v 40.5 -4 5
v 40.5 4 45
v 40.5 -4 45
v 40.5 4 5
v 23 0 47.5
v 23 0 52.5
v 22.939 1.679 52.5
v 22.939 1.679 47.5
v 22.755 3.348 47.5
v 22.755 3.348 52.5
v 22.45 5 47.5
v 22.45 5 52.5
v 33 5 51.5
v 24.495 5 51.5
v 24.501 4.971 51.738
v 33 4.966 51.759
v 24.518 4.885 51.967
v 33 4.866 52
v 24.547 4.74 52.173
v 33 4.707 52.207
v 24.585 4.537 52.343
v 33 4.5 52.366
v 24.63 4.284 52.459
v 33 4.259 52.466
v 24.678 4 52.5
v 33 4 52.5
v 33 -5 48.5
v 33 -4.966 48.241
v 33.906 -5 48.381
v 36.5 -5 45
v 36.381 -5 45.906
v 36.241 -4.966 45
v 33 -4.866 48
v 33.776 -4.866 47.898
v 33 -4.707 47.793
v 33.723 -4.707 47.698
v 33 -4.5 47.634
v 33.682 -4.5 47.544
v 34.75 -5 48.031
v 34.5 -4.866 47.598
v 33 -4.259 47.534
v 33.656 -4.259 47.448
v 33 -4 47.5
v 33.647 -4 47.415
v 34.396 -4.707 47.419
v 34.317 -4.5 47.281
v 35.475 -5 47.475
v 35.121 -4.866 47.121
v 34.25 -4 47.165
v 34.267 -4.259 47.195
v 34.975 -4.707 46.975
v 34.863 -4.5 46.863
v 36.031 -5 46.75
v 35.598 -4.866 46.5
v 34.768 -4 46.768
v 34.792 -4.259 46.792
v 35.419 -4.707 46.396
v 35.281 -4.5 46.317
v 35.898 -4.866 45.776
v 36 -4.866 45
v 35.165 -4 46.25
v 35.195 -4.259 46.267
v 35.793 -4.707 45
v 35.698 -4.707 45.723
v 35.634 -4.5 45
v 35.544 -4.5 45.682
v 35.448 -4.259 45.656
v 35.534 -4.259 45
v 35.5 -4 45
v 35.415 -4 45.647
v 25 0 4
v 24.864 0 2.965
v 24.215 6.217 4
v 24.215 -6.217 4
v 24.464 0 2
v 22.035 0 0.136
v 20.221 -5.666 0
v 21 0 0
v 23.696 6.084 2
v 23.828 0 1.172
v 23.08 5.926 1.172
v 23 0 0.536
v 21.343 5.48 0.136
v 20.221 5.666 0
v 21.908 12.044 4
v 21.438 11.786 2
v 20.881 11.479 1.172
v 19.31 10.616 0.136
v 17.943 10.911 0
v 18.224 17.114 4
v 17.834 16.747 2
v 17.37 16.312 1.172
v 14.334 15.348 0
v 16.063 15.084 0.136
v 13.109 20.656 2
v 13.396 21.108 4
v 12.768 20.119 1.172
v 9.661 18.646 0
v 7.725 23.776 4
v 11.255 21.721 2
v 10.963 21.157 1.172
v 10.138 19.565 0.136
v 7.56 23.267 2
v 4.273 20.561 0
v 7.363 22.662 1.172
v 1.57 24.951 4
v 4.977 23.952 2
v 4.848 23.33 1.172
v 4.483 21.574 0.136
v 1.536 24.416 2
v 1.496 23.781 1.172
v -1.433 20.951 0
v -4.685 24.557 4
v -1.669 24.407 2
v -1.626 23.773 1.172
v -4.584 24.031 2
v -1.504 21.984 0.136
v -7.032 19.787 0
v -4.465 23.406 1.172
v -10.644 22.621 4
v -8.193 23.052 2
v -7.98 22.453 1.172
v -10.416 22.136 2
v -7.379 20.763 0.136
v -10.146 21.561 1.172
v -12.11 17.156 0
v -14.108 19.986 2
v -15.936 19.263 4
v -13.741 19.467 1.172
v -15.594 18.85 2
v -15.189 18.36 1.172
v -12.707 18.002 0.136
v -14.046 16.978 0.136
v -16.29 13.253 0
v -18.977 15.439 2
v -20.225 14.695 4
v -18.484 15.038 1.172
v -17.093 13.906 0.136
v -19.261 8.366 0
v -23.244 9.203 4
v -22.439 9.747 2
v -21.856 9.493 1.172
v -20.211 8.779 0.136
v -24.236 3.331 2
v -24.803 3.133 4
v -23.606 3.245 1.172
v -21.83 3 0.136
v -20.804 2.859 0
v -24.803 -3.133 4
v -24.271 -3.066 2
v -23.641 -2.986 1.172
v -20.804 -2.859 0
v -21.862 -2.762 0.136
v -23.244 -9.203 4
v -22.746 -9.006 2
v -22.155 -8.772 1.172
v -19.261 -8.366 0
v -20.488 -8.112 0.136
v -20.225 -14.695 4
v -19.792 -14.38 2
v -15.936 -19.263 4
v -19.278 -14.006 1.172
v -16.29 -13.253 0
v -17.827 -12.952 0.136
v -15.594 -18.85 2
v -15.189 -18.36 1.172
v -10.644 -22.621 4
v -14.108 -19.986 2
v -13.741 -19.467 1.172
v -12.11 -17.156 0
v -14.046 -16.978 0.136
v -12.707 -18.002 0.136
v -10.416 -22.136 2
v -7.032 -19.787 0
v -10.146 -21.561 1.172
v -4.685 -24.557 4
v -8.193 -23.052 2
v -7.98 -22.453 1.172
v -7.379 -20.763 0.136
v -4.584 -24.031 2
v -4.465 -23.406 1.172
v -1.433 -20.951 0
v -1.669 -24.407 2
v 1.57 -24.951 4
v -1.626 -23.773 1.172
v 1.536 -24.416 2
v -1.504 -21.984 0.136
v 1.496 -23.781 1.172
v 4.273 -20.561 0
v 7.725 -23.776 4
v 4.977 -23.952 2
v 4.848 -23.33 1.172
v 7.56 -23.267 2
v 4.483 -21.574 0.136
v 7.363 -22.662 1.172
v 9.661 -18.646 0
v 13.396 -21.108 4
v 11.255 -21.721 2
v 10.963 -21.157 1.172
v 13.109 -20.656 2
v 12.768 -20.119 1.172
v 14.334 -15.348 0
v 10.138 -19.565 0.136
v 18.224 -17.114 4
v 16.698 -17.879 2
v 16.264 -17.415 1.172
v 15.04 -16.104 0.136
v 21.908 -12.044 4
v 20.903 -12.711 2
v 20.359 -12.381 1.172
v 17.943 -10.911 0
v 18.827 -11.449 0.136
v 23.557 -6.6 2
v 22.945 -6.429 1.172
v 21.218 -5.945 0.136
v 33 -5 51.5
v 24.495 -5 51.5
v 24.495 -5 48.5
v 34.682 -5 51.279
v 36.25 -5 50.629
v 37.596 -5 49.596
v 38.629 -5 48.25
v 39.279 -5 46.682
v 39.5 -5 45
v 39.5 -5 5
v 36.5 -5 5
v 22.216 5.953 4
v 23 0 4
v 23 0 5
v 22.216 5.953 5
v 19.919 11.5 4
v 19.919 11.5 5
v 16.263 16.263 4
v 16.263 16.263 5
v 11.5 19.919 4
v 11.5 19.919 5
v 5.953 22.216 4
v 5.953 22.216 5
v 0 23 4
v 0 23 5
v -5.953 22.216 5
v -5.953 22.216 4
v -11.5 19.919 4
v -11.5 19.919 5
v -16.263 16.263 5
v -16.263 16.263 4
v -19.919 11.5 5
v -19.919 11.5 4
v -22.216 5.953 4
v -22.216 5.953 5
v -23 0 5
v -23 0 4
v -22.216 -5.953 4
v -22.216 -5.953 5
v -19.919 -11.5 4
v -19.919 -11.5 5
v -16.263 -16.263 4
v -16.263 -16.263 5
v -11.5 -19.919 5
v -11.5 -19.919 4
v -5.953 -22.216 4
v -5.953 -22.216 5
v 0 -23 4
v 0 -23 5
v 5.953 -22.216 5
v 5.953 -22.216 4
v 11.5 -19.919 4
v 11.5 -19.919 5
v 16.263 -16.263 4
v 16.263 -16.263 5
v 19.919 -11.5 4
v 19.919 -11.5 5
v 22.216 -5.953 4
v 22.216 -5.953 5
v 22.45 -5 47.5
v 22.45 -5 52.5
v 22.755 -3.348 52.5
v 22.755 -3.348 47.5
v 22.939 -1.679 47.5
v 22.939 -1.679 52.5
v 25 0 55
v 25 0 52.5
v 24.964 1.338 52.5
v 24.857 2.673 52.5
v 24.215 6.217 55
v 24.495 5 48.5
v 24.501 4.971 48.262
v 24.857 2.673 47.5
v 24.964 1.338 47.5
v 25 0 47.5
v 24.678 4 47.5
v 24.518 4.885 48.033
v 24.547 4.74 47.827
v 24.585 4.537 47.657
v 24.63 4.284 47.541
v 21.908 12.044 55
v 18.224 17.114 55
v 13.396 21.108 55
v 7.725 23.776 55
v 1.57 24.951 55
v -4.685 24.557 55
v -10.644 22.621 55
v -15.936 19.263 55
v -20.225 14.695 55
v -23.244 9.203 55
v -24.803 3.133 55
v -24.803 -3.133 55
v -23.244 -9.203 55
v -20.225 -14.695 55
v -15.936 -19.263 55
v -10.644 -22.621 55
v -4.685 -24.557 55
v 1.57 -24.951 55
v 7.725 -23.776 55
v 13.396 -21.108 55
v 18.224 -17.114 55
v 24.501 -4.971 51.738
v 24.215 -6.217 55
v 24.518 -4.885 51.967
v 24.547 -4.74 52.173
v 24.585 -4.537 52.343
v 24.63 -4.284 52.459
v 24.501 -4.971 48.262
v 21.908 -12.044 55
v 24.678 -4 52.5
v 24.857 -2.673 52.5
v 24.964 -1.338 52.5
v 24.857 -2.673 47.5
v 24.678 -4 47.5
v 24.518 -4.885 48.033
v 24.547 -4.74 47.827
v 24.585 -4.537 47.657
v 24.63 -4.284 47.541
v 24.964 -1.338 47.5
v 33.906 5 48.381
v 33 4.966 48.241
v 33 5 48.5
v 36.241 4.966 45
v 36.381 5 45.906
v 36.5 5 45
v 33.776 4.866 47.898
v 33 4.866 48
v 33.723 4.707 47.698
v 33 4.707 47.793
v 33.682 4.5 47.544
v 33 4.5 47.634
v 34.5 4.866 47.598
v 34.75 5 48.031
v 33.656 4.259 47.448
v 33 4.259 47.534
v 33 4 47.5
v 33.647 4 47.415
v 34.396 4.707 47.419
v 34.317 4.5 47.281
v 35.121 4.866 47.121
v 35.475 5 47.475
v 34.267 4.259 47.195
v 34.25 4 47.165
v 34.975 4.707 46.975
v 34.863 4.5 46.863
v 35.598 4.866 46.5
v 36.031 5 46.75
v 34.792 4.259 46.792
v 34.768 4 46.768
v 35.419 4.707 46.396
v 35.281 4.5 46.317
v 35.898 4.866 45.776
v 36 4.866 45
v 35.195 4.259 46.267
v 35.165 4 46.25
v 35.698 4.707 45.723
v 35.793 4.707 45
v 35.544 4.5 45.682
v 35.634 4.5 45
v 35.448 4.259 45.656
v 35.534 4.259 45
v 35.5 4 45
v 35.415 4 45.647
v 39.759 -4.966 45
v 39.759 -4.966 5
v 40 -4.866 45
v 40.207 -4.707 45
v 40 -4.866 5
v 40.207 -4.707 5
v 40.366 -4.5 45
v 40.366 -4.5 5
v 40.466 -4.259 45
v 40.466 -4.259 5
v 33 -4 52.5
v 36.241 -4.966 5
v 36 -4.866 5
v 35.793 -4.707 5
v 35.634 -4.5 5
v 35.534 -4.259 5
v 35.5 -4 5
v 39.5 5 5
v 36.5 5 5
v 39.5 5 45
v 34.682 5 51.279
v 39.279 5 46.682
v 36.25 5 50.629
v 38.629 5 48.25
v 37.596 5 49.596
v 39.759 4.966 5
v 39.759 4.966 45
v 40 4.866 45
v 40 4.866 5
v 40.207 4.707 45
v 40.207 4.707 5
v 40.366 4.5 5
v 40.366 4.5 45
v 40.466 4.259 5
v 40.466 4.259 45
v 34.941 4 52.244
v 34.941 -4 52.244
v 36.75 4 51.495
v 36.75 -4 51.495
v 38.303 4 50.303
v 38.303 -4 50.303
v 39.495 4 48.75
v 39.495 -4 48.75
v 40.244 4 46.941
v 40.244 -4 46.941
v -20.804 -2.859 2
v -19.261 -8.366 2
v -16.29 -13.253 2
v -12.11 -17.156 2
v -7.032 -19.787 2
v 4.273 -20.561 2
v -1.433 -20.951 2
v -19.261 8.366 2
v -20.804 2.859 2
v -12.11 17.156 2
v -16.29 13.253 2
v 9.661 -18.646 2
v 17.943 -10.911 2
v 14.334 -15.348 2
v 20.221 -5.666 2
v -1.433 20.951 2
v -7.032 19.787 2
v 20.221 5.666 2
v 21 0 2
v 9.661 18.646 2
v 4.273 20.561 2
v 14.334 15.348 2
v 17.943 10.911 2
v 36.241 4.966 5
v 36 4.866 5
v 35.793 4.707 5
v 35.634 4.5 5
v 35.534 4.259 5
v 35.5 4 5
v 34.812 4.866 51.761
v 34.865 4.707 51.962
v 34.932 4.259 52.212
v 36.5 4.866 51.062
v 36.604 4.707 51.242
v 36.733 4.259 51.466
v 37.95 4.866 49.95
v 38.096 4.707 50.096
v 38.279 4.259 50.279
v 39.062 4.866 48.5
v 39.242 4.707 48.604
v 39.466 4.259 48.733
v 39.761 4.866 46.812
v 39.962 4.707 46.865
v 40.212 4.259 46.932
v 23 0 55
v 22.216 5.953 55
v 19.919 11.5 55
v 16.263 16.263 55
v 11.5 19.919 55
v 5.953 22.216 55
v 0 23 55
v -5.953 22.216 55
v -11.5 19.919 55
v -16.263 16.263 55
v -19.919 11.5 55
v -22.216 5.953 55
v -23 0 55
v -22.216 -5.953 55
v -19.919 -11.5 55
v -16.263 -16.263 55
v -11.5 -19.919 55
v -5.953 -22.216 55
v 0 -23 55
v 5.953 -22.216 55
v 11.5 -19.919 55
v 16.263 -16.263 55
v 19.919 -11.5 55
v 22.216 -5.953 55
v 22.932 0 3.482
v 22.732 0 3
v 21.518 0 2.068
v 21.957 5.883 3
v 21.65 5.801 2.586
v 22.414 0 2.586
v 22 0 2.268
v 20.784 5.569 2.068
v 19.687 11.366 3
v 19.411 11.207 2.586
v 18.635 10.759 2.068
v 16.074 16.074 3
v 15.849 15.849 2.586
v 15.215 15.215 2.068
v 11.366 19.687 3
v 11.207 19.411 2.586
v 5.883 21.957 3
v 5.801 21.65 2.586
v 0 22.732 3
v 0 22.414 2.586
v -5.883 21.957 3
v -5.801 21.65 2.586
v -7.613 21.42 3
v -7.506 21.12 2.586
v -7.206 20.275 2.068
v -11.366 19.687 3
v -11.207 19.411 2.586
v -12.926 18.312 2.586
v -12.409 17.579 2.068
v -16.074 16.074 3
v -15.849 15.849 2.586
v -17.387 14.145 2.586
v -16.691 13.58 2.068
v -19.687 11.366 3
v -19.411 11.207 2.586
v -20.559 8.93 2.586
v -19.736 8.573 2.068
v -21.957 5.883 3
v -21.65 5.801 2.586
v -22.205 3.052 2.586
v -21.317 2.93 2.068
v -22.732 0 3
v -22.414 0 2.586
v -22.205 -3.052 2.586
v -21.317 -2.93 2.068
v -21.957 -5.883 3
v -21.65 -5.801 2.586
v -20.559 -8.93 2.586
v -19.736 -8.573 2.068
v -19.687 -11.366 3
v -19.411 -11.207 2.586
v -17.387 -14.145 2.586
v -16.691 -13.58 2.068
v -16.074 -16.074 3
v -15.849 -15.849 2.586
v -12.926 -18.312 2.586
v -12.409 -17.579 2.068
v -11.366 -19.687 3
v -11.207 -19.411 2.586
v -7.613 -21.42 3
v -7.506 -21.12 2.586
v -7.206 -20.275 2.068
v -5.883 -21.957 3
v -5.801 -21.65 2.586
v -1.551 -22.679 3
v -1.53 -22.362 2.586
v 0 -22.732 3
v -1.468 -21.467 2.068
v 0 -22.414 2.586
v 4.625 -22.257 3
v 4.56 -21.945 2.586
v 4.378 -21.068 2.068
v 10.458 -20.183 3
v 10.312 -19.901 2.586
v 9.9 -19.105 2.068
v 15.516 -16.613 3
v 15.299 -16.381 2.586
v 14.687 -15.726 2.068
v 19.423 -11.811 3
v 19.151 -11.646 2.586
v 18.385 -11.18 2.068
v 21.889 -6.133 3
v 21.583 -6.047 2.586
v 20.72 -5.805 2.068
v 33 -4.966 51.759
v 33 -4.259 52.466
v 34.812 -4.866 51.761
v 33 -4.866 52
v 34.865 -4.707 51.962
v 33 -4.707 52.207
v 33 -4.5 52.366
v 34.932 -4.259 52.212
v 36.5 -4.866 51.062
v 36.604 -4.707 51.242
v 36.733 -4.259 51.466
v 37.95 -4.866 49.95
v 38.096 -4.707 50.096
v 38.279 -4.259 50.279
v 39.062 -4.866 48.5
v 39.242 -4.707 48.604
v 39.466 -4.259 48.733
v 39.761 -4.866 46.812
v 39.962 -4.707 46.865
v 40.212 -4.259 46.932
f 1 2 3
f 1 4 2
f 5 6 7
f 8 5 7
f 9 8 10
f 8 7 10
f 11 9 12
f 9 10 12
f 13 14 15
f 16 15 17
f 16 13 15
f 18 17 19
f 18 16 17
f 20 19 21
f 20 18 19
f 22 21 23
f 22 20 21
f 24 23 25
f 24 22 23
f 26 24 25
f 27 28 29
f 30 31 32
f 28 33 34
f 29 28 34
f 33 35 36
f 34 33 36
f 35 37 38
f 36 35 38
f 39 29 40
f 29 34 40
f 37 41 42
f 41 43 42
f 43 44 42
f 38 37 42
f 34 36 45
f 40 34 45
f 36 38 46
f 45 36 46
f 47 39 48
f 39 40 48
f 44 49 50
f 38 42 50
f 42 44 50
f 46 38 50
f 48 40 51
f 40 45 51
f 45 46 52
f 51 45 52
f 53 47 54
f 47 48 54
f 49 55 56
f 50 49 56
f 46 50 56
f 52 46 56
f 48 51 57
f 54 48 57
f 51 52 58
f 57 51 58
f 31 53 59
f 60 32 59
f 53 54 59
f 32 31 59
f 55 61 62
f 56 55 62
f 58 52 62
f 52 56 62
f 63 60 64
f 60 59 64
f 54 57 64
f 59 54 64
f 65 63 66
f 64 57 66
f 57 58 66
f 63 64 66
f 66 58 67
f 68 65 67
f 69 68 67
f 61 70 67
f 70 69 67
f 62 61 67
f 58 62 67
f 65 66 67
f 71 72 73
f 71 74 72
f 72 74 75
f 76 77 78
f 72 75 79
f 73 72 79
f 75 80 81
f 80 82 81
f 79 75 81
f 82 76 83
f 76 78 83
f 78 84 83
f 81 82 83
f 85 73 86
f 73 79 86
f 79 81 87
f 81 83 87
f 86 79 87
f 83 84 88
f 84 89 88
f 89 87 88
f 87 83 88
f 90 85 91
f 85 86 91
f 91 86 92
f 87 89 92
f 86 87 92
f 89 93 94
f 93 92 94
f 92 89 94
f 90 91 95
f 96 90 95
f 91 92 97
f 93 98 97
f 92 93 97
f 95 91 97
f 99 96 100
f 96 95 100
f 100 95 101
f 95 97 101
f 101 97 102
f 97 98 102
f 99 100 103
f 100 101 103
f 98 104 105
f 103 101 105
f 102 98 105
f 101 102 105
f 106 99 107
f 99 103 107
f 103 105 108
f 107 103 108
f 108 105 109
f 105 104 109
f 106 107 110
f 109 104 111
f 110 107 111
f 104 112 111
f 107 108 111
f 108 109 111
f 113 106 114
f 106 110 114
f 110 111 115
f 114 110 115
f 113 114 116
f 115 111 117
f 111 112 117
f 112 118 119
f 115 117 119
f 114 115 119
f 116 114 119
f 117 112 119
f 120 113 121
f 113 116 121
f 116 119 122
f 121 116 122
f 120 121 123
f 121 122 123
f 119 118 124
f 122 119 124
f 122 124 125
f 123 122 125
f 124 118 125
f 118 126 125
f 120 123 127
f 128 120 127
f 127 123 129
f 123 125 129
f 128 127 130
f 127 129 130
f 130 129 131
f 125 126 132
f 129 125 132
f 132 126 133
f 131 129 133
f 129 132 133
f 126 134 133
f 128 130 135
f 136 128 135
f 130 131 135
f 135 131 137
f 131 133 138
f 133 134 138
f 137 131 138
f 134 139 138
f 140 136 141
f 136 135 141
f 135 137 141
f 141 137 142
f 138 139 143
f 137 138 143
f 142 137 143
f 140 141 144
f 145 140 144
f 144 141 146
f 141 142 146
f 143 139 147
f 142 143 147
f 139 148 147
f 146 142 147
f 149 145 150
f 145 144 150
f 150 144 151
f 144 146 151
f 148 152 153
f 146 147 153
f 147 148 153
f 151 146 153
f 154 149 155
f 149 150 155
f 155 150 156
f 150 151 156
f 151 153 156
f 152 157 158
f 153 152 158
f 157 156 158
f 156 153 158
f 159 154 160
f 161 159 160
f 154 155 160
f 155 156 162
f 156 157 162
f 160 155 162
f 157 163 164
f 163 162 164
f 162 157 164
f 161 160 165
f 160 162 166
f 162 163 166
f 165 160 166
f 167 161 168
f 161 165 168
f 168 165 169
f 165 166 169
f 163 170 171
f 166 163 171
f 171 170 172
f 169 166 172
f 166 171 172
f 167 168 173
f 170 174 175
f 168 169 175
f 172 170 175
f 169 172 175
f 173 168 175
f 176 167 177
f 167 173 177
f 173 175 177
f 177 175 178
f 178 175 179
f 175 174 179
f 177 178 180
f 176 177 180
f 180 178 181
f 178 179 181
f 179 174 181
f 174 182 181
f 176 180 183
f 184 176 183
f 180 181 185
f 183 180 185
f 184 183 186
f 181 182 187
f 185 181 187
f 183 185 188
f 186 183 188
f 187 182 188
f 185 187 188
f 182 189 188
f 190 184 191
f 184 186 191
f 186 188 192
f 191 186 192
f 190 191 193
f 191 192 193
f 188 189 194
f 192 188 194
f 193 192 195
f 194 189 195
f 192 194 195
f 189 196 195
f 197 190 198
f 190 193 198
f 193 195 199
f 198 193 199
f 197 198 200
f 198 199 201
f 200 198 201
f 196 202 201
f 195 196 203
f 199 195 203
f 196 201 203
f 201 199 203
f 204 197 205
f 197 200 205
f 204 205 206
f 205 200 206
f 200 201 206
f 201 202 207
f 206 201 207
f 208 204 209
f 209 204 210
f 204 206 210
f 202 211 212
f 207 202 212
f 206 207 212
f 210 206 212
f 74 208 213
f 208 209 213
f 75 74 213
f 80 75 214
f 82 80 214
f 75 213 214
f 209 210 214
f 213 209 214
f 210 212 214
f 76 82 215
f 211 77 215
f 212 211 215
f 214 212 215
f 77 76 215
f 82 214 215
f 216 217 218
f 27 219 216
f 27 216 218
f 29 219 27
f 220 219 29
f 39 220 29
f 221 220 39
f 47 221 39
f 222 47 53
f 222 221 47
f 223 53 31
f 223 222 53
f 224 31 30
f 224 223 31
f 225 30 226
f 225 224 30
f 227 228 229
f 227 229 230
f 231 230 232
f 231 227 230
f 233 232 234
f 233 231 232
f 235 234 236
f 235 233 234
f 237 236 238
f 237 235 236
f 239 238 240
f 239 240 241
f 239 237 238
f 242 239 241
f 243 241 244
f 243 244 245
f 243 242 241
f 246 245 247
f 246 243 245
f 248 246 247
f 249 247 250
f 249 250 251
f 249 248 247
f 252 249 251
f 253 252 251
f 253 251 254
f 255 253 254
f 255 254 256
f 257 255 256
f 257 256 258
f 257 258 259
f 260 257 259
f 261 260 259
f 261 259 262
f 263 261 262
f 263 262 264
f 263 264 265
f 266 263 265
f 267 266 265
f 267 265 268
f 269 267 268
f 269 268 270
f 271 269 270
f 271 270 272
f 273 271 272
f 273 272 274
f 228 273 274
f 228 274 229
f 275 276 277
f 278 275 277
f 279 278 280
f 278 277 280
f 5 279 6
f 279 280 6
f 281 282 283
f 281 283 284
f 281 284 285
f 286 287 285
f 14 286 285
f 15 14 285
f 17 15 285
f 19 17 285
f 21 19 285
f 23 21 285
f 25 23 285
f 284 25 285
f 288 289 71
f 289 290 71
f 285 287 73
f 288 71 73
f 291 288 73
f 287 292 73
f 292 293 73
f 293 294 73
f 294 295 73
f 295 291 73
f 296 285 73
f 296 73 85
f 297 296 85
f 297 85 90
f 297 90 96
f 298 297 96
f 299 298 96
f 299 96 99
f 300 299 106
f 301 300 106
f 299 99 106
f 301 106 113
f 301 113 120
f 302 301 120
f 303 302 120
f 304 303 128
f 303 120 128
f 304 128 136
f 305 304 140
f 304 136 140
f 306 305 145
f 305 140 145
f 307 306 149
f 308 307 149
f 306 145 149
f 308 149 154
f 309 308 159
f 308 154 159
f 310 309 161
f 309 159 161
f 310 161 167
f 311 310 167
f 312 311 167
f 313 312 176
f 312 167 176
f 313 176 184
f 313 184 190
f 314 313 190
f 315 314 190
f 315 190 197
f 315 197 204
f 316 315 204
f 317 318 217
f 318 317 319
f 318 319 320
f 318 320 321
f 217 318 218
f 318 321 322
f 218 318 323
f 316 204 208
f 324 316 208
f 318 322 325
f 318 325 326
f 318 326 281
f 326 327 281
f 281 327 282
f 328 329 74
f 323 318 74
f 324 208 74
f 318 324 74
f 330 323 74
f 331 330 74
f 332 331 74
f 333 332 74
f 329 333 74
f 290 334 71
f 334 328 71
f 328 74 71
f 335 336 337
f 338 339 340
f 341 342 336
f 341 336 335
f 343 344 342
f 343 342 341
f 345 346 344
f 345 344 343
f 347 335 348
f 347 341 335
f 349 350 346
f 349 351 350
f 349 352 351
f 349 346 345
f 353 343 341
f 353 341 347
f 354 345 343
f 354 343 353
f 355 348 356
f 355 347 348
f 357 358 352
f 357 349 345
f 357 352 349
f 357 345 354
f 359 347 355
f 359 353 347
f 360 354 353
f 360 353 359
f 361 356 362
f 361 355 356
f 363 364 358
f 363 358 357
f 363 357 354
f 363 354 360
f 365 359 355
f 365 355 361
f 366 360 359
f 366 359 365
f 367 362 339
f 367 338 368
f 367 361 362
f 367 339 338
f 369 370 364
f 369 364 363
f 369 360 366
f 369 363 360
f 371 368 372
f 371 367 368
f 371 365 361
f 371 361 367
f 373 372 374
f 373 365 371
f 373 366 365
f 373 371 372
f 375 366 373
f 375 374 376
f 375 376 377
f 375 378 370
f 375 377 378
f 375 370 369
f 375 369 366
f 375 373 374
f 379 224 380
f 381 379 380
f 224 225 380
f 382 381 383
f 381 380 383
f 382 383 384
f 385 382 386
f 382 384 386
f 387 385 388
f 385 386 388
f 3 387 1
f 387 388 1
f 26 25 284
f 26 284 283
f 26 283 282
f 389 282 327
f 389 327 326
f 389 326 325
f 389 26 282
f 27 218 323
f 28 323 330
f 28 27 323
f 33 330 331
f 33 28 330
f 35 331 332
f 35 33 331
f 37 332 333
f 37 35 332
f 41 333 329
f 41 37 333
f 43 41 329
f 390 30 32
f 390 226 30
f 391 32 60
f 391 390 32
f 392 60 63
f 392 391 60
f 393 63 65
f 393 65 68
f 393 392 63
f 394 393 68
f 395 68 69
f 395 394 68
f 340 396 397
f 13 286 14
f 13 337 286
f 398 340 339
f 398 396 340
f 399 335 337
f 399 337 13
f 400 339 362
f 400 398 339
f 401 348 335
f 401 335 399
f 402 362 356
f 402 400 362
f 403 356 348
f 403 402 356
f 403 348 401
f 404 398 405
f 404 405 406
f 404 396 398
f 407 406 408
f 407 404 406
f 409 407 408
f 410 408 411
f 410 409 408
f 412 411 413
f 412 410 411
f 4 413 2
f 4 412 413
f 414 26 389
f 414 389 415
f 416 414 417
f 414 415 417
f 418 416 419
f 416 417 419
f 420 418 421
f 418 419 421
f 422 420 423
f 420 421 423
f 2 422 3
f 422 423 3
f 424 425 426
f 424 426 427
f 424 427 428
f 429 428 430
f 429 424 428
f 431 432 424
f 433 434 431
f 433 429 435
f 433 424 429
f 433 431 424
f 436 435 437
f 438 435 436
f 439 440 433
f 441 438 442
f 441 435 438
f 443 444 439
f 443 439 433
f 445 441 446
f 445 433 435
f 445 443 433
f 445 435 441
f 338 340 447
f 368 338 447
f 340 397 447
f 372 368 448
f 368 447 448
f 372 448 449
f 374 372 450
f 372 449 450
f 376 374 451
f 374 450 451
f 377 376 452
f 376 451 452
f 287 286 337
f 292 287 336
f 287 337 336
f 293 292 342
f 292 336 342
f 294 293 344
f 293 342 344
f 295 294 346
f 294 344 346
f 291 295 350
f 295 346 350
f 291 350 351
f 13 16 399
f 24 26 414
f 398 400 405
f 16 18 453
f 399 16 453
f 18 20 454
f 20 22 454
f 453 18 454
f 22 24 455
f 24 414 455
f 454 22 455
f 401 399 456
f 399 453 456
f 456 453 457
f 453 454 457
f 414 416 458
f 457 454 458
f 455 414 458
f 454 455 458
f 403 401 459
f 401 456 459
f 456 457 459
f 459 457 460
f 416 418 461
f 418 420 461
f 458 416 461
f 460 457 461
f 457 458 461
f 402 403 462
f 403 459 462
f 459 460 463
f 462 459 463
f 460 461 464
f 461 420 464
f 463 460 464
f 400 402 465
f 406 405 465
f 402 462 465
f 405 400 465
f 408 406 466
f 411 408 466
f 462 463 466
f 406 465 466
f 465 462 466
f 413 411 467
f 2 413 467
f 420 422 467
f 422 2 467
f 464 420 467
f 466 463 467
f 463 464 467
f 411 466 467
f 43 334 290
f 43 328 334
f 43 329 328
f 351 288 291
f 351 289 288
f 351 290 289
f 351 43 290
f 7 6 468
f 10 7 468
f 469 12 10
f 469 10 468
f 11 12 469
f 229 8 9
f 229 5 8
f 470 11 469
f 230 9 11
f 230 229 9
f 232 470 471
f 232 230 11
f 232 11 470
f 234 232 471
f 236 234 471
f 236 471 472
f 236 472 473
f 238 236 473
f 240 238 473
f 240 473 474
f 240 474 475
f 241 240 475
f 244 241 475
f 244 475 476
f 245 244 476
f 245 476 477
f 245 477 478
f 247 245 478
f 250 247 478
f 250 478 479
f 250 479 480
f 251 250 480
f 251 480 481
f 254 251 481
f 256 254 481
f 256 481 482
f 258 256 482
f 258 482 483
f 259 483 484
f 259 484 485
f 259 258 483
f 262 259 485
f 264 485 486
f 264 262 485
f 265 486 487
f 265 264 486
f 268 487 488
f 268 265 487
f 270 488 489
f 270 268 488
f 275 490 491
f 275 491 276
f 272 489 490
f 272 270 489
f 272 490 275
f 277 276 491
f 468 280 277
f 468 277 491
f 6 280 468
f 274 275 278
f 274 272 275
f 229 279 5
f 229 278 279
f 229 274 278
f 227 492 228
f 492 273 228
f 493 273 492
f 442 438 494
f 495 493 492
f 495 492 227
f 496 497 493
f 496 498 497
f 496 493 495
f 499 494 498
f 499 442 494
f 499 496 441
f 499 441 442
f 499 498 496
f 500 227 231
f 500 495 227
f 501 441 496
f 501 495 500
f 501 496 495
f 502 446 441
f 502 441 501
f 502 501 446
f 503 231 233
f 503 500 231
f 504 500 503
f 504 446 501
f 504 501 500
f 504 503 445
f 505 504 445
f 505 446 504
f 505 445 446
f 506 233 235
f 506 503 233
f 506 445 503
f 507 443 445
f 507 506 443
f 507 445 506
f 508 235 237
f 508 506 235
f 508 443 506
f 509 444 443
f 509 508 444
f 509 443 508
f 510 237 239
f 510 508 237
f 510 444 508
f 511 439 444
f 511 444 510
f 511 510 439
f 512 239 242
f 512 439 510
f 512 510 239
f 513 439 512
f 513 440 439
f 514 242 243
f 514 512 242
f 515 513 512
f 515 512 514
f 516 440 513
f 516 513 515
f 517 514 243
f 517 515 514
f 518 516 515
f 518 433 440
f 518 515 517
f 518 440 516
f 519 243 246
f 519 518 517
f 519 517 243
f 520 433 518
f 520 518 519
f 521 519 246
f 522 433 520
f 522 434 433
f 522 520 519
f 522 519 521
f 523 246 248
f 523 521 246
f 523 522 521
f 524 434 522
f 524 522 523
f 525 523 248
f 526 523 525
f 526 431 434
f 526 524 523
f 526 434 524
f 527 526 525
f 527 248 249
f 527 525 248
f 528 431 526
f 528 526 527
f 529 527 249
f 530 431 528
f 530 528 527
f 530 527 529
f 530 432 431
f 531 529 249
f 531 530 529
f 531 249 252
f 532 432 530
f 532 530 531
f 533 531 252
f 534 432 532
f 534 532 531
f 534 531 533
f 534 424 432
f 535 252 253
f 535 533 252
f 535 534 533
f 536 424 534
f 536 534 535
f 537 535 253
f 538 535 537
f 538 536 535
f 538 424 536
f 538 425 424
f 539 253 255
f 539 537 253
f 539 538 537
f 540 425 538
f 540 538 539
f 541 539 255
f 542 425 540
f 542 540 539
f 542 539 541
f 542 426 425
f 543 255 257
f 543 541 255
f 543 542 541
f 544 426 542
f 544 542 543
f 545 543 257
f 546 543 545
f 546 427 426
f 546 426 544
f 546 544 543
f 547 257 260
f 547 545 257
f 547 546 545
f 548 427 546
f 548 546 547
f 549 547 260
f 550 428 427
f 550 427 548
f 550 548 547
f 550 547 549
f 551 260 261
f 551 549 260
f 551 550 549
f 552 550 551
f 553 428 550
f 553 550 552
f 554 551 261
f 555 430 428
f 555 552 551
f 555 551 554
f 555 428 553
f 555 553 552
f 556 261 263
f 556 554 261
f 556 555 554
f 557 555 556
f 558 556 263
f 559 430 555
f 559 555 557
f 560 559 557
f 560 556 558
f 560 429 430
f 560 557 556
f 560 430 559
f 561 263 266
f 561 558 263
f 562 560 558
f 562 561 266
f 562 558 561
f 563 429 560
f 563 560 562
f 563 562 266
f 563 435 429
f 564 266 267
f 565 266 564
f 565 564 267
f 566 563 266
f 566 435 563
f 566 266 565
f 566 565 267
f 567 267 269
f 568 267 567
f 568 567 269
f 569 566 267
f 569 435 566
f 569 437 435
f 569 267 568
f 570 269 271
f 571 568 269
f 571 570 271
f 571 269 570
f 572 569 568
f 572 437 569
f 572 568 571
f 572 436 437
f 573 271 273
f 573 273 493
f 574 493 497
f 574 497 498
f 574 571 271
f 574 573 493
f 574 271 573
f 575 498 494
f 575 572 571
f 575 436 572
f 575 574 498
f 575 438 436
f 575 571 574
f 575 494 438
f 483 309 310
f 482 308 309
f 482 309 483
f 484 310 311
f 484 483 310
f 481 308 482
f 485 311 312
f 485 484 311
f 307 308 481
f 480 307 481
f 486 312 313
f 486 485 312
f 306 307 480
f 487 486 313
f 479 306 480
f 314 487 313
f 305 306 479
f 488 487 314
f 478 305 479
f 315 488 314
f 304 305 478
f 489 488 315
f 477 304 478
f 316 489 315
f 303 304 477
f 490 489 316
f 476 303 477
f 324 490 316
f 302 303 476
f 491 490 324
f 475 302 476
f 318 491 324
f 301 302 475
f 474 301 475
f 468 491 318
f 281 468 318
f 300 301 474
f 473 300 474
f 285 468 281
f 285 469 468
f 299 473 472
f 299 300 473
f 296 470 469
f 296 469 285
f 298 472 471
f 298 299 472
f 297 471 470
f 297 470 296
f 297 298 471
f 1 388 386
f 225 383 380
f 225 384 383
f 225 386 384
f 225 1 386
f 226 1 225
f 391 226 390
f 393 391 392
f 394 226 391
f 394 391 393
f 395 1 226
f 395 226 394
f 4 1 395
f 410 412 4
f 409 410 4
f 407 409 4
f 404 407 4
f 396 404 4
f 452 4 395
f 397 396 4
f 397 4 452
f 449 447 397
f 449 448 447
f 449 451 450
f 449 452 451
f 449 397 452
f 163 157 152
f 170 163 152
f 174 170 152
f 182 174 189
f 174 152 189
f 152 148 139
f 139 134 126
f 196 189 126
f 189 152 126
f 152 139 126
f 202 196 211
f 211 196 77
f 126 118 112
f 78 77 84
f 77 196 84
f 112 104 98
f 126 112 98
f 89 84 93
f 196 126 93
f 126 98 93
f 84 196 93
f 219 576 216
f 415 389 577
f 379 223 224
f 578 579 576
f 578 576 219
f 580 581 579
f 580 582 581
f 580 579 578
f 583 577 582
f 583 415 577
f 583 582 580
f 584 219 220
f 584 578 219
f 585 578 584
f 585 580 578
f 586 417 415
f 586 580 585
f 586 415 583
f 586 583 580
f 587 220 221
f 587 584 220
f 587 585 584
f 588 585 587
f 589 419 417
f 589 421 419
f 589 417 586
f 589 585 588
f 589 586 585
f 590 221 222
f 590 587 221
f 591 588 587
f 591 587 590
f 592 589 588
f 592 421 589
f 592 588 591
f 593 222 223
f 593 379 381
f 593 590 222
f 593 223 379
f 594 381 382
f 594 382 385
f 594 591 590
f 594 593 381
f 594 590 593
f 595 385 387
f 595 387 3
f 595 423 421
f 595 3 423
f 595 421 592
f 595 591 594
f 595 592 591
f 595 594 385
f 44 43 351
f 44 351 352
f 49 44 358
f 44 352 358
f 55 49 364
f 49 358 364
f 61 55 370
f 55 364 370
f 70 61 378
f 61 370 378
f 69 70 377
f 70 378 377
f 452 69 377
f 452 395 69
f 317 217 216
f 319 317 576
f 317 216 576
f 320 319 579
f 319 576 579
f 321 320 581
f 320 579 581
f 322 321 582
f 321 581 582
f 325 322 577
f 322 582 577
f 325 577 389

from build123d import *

# Parameters (mm, degrees)
F0_R      = 25
F1_DEPTH  = 55
F2_R      = 4
F14_T     = -2
F4_W      = 10
F4_H      = 5
F16_R     = 1
F3_R      = 23
F17_DEPTH = 50


with BuildPart() as f1:
    # F0 (on Top) → F1 (new body)
    with BuildSketch(Plane.XY):
        Circle(F0_R)
    extrude(amount=F1_DEPTH)

    # F2
    f2_edges = [f1.edges().sort_by_distance(p)[0] for p in [
        (-25, 0, 0),
    ]]
    fillet(f2_edges, radius=F2_R)

    # F14
    f14_openings = [f1.faces().sort_by_distance(p)[0] for p in [
        (0, 0, 55),
    ]]
    offset(amount=F14_T, openings=f14_openings)

    # F15: sweep along a path in F13
    with BuildLine(Plane.XZ) as f15_path:
        Line((0, 50), (33, 50))
        ThreePointArc((33, 50), (36.5355339059, 48.5355339059), (38, 45))
        Line((38, 45), (38, 5))
    # F4 (on Right) → F15 (sweep)
    with BuildSketch(Plane.YZ):
        with Locations((0, 50)):
            Rectangle(F4_W, F4_H)
    sweep(path=f15_path.line)

    # F16
    f16_edges = [f1.edges().sort_by_distance(p)[0] for p in [
        (40.5, -5, 25),
        (40.5, 5, 25),
        (35.5, -5, 25),
        (35.5, 5, 25),
    ]]
    fillet(f16_edges, radius=F16_R)

    # F3 (on face) → F17 (cut)
    with BuildSketch(Plane.XY.offset(55)):
        Circle(F3_R)
    extrude(amount=-F17_DEPTH, mode=Mode.SUBTRACT)


solid = f1.part
